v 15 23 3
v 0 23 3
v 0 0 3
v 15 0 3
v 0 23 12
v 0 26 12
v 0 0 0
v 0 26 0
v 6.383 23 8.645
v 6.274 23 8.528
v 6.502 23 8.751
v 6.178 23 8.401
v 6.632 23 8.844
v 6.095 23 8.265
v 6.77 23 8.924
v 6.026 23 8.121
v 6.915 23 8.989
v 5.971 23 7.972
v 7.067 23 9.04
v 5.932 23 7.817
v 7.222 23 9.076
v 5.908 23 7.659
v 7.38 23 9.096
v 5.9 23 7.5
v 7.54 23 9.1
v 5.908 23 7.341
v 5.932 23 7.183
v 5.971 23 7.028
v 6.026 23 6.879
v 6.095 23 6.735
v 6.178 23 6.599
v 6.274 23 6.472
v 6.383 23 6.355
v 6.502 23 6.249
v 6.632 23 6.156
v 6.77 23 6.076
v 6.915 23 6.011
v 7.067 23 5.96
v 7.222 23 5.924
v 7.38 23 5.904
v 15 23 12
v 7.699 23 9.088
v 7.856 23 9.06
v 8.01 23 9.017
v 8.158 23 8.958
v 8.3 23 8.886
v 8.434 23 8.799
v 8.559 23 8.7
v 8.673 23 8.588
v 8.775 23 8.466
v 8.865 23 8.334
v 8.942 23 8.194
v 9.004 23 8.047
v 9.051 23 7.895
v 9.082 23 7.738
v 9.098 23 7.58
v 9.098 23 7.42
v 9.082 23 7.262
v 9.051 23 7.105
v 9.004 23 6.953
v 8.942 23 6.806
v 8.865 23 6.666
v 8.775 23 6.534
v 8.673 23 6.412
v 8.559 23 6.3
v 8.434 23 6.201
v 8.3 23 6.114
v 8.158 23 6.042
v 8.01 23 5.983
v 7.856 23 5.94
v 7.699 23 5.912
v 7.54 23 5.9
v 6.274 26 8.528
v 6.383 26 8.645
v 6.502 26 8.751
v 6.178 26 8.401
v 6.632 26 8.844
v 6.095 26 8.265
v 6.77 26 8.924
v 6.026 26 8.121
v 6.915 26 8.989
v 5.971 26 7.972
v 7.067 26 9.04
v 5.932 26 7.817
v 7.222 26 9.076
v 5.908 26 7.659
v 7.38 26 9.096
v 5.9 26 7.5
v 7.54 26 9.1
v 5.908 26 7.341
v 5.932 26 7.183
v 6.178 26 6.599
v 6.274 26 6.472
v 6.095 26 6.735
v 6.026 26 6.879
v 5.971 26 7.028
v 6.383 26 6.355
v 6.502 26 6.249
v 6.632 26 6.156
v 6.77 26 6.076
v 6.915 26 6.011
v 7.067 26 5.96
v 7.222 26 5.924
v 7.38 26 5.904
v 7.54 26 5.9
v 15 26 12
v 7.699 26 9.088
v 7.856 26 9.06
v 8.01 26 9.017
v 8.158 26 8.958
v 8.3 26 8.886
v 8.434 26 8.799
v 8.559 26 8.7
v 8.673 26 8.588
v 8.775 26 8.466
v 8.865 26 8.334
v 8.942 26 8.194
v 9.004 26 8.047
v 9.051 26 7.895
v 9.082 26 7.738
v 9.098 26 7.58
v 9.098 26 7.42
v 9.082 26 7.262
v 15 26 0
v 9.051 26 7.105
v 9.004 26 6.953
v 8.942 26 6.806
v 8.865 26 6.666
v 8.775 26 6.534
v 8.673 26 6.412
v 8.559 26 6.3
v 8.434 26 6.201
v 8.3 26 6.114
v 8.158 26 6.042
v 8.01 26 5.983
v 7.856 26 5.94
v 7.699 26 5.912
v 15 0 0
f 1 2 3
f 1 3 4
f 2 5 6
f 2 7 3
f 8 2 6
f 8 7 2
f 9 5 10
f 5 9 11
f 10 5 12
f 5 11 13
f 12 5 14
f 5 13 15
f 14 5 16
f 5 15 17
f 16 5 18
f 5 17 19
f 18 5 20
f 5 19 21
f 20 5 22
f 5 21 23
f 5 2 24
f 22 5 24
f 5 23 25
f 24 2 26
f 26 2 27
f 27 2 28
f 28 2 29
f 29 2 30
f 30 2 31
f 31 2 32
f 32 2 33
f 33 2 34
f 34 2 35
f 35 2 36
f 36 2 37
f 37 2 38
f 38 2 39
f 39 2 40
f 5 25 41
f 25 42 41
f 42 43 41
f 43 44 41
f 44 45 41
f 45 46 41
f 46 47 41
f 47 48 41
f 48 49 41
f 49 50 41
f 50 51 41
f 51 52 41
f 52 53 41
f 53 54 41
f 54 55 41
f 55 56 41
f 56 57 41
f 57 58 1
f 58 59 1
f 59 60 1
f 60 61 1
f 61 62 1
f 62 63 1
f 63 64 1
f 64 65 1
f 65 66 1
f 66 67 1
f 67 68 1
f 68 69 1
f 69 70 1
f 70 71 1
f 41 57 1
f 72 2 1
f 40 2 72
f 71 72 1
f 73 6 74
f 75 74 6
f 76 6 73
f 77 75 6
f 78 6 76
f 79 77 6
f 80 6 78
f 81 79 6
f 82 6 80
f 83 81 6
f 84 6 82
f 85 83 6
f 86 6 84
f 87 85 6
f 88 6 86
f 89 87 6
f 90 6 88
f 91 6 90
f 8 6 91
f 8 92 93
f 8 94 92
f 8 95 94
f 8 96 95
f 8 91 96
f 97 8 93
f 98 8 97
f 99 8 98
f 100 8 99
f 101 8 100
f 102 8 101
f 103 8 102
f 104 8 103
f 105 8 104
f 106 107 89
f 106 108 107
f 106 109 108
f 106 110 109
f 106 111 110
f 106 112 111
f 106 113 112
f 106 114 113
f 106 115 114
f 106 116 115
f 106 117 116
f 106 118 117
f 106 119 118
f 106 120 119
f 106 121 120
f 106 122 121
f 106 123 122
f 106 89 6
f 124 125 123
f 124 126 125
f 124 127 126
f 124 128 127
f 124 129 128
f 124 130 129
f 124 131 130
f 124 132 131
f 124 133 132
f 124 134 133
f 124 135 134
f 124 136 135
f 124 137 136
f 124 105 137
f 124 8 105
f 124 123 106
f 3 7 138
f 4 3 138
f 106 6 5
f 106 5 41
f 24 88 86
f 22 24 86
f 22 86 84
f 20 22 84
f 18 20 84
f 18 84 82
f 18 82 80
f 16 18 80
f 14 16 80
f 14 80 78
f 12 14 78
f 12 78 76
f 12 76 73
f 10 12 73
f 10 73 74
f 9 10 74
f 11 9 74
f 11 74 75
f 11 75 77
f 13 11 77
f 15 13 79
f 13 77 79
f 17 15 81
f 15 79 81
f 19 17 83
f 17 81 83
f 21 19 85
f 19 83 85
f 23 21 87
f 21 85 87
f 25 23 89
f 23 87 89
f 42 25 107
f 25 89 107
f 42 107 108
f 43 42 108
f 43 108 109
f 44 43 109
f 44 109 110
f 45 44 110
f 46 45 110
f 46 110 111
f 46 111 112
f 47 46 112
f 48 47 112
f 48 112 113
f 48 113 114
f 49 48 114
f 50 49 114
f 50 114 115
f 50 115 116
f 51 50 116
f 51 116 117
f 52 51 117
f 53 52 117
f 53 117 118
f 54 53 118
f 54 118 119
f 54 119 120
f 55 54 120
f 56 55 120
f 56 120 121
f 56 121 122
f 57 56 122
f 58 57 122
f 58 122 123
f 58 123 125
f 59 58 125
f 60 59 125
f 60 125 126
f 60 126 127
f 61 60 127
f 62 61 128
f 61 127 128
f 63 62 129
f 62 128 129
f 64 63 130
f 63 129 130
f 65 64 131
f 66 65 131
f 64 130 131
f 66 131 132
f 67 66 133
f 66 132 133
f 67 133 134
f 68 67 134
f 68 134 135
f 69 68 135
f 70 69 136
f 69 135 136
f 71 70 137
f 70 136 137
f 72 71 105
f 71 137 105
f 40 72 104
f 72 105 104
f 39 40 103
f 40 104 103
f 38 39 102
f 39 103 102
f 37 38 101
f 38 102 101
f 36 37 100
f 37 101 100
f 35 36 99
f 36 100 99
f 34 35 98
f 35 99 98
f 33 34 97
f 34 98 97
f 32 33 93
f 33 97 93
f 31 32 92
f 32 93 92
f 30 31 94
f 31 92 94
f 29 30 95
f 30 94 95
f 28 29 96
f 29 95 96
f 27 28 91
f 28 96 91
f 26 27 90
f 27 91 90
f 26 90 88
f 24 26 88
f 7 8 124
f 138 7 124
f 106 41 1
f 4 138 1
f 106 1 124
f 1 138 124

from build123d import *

# Parameters (mm, degrees)
F0_W     = 15
F0_H     = 23
F1_DEPTH = 3
F0_H_2   = 3
F2_DEPTH = 12
F4_D     = 3.2


with BuildPart() as f1:
    # F0 (on Top) → F1 (new body)
    with BuildSketch(Plane.XY):
        with Locations((7.5, 11.5)):
            Rectangle(F0_W, F0_H)
    extrude(amount=F1_DEPTH)

    # F0 (on Top) → F2 (join)
    with BuildSketch(Plane.XY):
        with Locations((7.5, 24.5)):
            Rectangle(F0_W, F0_H_2)
    extrude(amount=F2_DEPTH)

    # F4 (through all)
    with Locations(Plane.XZ.offset(-23)):
        with Locations((7.5, 7.5)):
            Hole(F4_D / 2)


solid = f1.part
